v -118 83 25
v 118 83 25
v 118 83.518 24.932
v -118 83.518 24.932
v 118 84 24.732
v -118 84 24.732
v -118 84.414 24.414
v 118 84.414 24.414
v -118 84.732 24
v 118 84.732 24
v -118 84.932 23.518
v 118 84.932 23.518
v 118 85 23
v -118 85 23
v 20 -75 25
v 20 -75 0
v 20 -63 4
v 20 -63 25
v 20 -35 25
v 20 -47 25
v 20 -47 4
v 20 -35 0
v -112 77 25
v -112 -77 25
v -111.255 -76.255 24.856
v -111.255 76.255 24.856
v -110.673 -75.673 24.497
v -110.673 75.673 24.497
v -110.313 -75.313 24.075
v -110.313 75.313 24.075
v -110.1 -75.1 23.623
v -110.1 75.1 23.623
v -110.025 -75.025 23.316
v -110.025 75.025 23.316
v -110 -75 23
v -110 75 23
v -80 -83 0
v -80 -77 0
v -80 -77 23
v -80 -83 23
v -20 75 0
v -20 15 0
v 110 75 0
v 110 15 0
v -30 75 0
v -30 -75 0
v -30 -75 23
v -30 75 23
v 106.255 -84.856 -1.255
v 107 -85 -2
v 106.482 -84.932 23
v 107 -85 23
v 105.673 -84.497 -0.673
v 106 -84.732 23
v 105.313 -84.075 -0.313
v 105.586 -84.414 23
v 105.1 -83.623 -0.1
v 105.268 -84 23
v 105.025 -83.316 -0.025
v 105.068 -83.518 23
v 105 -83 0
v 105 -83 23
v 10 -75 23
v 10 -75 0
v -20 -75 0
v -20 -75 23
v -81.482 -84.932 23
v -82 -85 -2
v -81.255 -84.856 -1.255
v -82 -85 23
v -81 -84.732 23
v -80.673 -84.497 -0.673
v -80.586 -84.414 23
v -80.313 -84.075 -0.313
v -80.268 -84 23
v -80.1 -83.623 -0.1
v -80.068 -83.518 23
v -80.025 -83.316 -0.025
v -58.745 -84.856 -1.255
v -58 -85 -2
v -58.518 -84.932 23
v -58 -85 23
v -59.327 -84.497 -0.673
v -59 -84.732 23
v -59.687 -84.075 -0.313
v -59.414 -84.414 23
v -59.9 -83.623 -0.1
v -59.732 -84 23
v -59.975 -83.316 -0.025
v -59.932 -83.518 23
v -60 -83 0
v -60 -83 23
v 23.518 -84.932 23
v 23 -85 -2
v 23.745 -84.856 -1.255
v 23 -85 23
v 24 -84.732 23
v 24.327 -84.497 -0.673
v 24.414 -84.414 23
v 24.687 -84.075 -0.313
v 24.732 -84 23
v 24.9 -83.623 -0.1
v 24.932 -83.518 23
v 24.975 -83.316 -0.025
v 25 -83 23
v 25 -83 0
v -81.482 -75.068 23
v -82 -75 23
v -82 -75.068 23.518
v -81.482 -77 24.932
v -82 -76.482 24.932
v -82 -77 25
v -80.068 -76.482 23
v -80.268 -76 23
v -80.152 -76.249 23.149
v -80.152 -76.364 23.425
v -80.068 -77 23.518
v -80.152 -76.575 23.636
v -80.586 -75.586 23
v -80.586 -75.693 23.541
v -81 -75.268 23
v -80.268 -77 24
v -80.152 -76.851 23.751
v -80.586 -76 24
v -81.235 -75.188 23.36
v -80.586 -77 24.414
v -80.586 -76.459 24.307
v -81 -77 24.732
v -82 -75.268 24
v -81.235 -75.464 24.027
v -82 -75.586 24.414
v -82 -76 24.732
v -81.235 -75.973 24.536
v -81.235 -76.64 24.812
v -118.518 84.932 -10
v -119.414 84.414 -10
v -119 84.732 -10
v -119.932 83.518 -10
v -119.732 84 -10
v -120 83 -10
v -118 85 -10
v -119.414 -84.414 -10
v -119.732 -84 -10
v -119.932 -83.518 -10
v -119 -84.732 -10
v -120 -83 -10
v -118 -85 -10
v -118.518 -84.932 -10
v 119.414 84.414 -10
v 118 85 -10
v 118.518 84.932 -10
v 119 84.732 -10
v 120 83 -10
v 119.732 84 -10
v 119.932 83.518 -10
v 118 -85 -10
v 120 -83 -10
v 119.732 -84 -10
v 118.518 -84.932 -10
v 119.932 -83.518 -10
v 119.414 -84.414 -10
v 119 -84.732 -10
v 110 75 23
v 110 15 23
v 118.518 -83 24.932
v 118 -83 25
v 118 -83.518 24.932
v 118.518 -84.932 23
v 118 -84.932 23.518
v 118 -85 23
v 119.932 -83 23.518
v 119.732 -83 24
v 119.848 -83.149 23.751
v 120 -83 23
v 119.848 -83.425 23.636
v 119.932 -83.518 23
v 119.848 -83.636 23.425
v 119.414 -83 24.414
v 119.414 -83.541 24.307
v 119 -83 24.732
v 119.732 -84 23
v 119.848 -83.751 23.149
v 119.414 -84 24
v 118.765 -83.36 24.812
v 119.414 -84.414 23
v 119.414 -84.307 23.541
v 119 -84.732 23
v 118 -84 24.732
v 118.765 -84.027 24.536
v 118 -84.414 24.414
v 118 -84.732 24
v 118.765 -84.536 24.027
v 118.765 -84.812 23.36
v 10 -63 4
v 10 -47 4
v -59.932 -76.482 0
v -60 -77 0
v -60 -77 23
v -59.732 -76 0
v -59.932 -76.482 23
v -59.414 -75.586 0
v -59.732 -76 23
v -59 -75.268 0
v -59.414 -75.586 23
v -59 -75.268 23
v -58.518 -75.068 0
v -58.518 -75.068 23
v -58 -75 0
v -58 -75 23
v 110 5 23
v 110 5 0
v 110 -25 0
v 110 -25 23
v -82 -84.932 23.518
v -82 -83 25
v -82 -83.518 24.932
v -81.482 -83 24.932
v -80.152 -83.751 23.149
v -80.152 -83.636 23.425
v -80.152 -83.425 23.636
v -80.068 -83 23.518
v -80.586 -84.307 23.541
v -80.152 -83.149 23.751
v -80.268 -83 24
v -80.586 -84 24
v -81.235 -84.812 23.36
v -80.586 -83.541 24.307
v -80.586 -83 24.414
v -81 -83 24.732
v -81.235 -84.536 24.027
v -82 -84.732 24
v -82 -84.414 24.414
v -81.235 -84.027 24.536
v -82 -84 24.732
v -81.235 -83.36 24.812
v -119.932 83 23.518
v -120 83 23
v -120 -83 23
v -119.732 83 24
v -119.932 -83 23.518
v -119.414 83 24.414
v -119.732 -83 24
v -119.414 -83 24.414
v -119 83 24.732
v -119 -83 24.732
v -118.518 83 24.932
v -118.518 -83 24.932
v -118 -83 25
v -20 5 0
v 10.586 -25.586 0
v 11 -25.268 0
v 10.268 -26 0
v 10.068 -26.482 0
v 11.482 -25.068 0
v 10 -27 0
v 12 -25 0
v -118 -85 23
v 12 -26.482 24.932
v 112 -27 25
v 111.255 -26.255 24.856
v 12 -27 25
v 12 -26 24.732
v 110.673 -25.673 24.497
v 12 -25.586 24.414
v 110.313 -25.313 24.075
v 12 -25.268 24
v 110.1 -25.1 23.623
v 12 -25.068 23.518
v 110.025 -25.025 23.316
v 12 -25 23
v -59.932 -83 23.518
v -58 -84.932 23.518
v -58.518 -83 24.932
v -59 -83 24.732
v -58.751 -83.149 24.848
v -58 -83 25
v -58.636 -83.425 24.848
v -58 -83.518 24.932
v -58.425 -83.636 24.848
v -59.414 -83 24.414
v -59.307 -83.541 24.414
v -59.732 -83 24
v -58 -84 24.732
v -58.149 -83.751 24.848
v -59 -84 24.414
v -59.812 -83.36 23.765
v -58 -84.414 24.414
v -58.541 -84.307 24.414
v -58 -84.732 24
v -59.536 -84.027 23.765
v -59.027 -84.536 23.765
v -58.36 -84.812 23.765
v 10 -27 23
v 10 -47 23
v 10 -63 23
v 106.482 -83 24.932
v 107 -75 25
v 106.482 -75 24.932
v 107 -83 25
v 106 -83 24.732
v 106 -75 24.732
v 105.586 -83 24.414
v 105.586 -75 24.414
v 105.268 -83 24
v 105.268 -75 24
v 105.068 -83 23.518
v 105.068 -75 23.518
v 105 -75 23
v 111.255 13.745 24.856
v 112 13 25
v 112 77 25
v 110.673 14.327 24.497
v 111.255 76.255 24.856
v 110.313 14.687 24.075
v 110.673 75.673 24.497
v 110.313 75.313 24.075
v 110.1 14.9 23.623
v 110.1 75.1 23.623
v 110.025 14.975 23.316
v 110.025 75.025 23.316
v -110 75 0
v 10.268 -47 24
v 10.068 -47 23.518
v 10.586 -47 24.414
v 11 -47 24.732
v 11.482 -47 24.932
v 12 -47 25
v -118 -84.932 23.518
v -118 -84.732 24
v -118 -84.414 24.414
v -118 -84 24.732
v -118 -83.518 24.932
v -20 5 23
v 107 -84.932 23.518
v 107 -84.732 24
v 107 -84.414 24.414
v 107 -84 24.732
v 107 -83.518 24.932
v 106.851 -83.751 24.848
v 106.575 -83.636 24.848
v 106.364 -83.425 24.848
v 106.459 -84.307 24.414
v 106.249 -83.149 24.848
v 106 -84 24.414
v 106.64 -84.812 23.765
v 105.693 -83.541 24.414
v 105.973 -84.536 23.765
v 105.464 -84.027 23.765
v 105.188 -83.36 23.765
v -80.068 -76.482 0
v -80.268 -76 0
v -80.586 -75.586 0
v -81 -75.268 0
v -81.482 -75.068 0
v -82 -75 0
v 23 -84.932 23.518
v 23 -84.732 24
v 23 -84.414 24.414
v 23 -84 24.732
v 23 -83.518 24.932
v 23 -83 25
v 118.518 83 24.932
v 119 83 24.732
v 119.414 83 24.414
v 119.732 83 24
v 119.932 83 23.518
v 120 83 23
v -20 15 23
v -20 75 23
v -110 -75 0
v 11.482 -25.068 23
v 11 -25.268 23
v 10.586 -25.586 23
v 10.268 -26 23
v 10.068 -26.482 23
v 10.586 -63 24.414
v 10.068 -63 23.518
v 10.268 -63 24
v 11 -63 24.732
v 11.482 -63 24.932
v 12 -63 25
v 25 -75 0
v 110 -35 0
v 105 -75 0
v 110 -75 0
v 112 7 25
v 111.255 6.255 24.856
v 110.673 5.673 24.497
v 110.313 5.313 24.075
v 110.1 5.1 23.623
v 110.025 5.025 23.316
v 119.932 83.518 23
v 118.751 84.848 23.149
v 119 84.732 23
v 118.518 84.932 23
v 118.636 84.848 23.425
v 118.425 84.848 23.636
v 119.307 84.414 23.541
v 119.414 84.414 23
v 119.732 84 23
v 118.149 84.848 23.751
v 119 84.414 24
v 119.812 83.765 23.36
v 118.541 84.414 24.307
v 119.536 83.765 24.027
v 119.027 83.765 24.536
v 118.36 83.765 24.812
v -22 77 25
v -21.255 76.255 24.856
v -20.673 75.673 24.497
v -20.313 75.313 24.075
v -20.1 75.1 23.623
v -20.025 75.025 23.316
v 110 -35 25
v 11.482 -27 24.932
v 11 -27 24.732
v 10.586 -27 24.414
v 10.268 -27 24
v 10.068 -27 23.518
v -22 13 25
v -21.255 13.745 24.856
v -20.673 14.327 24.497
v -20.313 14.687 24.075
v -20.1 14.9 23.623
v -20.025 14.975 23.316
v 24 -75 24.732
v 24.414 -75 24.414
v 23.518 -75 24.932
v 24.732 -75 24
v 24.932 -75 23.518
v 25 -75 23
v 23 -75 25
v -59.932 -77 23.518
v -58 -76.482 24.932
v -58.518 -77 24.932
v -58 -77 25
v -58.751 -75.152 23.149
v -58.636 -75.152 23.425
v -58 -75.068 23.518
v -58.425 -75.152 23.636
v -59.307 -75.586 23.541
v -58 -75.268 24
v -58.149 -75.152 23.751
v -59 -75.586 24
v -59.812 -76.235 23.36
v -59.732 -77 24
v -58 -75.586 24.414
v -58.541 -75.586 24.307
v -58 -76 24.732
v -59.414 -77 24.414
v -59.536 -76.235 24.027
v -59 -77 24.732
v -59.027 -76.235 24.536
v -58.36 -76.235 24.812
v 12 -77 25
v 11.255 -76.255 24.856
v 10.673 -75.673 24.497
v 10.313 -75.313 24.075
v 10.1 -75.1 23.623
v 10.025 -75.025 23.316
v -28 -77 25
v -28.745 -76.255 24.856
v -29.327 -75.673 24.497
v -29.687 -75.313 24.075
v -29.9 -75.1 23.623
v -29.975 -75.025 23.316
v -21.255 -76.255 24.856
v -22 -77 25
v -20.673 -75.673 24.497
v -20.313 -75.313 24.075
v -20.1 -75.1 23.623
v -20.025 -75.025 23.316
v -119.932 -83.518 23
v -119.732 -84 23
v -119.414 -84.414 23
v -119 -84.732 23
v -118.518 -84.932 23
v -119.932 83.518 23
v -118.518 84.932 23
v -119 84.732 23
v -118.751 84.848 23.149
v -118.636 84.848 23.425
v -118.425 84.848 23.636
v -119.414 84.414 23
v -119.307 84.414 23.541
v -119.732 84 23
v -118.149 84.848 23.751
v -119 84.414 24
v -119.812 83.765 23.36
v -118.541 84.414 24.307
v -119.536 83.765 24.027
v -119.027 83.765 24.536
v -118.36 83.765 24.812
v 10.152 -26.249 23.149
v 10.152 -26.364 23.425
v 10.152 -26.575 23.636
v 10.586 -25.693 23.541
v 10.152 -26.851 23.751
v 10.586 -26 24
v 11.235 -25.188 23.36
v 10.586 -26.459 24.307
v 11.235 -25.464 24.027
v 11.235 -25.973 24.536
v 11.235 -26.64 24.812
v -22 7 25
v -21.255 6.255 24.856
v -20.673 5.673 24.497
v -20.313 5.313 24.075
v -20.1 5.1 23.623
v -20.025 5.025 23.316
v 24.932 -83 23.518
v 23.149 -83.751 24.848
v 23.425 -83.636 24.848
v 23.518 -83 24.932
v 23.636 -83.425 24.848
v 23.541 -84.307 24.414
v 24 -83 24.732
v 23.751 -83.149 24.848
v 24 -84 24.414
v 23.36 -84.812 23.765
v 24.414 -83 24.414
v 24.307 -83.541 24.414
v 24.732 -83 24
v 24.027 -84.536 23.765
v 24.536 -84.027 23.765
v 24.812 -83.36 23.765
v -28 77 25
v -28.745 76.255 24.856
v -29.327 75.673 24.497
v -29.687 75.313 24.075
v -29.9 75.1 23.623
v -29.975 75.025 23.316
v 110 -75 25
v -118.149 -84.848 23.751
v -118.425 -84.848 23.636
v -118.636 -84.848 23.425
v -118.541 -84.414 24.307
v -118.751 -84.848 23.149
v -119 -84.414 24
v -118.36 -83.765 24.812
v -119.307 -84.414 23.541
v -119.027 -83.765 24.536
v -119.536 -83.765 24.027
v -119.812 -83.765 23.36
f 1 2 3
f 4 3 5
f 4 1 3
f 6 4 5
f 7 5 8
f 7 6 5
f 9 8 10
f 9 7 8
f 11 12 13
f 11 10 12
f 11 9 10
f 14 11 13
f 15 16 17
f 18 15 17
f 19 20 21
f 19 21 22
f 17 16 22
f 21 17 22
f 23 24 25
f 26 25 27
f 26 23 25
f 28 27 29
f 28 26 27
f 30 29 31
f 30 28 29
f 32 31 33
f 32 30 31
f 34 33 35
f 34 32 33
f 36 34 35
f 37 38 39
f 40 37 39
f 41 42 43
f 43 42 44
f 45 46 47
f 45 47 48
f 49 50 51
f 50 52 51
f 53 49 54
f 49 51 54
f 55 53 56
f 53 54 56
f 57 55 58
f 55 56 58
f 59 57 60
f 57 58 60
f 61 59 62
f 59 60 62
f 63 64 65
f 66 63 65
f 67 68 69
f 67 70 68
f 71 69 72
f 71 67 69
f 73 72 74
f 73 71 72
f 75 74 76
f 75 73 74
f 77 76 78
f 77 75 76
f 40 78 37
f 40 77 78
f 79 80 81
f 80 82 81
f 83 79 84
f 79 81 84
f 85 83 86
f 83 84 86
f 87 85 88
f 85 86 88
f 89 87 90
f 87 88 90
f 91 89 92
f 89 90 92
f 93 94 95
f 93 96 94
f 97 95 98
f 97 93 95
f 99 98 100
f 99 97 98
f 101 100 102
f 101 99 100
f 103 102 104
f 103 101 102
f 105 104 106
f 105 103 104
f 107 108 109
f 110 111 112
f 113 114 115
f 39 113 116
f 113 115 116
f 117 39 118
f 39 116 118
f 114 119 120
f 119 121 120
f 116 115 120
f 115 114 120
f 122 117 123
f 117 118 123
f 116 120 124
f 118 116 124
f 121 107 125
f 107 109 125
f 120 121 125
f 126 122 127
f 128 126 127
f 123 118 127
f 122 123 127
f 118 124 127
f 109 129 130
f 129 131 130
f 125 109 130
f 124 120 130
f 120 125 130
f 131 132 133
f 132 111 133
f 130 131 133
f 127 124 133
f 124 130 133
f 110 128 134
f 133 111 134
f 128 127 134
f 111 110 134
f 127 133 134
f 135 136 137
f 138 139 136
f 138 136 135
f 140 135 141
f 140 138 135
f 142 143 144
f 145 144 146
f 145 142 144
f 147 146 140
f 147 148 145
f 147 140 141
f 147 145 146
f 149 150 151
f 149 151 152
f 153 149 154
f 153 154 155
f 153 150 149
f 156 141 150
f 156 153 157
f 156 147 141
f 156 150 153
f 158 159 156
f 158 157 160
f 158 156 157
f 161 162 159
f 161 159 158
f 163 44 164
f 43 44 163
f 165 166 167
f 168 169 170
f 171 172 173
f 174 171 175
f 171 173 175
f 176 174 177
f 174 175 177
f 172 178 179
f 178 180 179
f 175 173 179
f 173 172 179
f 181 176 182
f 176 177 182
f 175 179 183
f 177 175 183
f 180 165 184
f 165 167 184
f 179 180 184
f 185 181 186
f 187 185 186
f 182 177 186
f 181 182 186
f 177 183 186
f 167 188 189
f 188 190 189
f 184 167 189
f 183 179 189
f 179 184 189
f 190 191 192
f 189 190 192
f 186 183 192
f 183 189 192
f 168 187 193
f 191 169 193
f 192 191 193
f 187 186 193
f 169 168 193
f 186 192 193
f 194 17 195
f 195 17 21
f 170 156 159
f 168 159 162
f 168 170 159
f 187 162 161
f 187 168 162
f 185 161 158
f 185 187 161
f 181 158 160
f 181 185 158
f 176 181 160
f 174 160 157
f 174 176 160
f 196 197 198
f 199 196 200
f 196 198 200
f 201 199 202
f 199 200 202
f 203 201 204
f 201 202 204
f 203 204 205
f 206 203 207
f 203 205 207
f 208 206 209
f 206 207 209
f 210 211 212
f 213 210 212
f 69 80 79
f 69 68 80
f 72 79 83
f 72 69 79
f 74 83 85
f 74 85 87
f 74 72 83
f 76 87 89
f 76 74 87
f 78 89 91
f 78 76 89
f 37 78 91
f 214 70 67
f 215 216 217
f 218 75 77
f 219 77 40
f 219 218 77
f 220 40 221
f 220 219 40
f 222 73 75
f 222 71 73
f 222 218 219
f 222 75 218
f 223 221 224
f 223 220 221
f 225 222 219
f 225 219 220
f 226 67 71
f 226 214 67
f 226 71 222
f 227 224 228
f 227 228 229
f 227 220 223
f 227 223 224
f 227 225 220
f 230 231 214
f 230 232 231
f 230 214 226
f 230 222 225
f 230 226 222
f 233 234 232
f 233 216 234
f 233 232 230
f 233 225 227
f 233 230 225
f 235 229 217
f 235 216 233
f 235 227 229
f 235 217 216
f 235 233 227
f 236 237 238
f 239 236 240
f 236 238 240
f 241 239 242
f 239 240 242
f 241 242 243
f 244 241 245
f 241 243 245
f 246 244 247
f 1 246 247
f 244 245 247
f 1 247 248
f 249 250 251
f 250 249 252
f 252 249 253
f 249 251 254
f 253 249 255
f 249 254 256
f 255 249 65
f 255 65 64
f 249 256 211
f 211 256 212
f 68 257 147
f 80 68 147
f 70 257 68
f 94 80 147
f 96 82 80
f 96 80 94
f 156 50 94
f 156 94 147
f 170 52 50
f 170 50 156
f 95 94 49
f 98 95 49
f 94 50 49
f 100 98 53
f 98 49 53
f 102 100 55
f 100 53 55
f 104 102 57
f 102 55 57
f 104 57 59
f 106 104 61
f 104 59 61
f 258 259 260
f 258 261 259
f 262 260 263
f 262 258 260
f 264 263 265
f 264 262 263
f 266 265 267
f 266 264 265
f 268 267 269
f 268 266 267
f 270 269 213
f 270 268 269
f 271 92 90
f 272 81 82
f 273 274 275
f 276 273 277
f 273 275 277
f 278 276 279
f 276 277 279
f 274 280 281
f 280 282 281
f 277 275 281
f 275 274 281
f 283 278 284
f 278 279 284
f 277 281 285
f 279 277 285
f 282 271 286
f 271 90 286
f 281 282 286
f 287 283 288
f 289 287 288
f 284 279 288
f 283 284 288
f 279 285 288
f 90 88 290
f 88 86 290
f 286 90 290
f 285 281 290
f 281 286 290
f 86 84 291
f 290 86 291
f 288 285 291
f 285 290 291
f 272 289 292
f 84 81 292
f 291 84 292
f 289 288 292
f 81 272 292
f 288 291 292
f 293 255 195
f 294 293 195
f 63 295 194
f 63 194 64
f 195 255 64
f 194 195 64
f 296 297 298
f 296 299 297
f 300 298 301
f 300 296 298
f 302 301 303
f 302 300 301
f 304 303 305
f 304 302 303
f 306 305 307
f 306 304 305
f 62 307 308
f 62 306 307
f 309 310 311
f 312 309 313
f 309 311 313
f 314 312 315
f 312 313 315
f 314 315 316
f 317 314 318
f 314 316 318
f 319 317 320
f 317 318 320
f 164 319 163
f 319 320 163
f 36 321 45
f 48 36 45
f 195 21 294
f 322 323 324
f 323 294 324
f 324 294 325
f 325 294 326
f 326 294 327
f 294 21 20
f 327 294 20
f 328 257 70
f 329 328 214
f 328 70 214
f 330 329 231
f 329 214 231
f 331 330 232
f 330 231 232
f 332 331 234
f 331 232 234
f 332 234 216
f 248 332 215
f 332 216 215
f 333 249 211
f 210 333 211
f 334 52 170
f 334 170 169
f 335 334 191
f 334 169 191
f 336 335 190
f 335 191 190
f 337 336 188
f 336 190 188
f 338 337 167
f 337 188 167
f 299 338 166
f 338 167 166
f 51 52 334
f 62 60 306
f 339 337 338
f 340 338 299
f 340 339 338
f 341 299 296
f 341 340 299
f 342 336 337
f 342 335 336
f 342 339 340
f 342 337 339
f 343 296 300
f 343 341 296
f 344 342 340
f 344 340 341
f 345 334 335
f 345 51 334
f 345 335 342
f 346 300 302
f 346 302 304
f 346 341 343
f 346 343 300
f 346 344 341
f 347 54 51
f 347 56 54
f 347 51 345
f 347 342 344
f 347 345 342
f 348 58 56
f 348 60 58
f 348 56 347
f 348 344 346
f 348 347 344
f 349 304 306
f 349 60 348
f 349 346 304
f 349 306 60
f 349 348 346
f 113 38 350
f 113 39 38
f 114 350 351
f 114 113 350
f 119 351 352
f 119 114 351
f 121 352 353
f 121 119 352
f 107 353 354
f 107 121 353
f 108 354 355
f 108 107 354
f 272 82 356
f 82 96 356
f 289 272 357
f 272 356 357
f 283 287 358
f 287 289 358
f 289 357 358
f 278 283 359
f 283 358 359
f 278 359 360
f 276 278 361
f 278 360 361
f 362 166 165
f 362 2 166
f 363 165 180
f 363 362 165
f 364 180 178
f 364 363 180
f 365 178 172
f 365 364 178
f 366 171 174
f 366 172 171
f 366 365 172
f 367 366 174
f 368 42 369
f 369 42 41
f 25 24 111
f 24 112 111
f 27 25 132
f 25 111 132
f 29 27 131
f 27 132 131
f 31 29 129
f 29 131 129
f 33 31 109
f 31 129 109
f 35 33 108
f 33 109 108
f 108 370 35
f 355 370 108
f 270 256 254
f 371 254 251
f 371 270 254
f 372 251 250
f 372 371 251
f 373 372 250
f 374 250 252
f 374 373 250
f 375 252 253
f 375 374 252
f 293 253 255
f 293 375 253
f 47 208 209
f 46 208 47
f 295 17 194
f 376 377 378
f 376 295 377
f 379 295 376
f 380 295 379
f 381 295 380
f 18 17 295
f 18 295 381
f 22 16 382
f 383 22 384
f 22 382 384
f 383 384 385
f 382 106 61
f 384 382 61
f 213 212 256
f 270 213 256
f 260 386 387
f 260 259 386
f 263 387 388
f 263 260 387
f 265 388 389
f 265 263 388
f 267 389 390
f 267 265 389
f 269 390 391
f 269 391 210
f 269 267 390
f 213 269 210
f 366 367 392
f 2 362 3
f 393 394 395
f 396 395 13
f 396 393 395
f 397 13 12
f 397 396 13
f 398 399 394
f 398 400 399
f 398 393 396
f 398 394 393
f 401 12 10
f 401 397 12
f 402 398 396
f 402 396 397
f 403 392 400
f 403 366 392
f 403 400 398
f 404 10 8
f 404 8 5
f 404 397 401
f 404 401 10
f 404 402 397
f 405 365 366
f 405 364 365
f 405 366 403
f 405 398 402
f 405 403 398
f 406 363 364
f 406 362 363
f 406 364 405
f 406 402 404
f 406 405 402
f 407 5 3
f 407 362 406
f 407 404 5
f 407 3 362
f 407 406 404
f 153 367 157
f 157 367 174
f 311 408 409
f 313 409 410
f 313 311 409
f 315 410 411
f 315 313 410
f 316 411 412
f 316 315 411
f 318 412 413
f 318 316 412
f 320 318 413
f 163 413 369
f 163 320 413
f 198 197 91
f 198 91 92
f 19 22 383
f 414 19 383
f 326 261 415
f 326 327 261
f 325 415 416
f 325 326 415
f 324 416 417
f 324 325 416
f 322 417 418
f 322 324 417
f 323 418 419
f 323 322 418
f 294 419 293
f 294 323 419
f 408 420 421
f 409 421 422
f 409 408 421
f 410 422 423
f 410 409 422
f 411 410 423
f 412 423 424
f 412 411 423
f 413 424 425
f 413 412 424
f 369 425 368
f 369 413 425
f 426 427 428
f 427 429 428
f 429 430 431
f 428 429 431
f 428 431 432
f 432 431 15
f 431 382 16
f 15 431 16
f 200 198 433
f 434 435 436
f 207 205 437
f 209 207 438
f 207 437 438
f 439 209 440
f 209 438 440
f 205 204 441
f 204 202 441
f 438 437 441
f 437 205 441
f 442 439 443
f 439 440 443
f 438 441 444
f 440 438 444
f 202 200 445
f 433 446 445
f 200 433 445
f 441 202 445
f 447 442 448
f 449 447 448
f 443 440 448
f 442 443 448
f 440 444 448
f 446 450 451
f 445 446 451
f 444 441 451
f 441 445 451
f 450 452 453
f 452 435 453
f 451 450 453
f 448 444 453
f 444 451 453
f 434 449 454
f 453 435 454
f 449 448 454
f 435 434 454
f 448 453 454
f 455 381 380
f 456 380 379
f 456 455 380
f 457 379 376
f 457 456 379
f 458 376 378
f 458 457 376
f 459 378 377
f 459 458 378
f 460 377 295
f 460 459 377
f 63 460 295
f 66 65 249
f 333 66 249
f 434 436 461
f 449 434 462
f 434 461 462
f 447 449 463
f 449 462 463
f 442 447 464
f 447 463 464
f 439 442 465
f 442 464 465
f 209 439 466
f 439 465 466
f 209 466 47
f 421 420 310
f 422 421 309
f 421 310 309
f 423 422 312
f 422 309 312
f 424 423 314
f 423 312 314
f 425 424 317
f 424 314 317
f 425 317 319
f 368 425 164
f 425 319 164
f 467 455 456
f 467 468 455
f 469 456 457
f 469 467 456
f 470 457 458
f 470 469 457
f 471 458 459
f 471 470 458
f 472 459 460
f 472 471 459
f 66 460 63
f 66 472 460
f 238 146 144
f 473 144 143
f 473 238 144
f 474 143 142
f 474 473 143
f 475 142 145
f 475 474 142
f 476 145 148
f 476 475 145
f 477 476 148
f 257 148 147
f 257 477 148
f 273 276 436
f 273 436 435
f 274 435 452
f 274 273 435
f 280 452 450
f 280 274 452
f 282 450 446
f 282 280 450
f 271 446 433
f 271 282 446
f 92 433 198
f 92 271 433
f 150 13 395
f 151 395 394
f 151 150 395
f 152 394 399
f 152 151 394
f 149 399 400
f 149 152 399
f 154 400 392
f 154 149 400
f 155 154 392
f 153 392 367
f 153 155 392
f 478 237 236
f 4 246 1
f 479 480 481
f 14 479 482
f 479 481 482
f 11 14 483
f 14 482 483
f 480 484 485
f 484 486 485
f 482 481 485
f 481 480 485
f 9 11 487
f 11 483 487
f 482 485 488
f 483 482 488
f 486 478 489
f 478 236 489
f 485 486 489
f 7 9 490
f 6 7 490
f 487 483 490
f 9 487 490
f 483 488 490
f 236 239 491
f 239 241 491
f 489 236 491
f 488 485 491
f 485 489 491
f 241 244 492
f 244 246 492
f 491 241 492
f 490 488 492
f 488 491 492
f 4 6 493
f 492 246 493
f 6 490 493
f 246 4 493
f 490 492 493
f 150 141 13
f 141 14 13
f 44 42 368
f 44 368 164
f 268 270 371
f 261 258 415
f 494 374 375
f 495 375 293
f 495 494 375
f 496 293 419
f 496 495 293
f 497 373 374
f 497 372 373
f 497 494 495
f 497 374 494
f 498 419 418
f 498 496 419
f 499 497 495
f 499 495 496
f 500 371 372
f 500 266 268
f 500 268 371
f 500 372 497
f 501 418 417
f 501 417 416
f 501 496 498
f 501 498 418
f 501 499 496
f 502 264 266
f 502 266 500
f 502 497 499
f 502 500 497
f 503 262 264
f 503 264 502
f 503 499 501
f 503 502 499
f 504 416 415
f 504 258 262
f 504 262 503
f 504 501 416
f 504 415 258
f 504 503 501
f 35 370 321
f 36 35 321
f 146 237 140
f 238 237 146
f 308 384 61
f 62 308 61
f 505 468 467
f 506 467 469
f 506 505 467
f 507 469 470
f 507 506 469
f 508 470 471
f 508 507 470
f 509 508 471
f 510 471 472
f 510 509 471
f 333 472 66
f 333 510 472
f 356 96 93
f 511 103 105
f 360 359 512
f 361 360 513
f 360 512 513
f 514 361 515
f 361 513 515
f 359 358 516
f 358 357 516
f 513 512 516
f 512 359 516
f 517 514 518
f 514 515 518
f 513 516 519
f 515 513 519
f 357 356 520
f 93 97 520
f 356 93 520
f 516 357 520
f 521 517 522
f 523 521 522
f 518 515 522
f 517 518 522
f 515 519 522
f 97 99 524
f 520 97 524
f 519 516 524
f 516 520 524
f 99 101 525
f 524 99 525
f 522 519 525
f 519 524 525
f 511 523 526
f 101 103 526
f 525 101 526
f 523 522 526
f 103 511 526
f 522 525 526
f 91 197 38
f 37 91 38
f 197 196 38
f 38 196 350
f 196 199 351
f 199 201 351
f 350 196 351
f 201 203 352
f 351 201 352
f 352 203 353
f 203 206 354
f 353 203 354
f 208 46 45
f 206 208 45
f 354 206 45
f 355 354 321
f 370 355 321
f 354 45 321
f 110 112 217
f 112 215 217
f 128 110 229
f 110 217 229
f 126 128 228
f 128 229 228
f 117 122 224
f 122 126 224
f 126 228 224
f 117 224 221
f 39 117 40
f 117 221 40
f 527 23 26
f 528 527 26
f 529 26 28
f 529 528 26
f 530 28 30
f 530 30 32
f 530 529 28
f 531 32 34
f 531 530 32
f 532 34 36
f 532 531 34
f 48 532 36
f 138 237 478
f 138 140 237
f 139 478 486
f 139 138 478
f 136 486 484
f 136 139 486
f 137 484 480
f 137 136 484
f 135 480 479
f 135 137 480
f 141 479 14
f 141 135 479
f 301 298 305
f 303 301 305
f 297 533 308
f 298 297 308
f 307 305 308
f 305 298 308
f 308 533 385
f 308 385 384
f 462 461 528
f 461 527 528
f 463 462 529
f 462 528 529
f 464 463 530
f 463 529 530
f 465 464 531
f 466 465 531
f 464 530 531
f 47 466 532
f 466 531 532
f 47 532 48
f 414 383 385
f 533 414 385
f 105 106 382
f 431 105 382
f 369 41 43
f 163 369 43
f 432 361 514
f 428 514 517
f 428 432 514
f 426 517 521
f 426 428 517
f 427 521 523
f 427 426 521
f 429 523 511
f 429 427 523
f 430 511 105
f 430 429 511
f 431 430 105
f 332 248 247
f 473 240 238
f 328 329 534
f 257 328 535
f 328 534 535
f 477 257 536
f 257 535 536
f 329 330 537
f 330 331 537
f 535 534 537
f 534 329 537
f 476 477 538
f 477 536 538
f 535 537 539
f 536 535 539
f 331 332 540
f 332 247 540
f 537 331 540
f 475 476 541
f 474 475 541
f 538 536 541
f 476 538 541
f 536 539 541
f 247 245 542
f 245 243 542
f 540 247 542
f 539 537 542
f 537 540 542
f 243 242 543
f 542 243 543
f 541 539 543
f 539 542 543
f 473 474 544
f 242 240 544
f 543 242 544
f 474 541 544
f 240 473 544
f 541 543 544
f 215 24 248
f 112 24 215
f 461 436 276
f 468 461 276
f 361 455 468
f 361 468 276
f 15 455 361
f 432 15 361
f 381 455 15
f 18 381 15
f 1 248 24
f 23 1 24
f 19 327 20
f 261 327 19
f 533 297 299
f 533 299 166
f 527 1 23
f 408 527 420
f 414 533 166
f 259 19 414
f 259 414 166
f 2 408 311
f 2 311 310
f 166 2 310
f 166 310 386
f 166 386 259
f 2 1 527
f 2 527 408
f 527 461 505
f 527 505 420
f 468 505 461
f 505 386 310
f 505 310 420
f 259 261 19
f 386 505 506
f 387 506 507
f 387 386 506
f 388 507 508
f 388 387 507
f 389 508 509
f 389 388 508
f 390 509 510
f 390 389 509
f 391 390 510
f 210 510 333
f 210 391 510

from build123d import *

# Parameters (mm, degrees)
F0_W     = 80
F0_H     = 150
F0_W_2   = 130
F0_H_2   = 60
F1_DEPTH = 25
F2_W     = 240
F2_H     = 170
F3_DEPTH = 10
F4_W     = 20
F4_H     = 25
F5_DEPTH = 10
F6_R     = 2
F7_W     = 16
F7_H     = 21
F8_DEPTH = 10


with BuildPart() as f1:
    # F0 (on Top) → F1 (new body)
    with BuildSketch(Plane.XY):
        Polygon((105, -85), (120, -85), (120, 85), (-120, 85), (-120, -85), (25, -85), (25, -75), (20, -75), (20, -35), (110, -35), (110, -75), (105, -75), align=None)
        Polygon((110, 5), (110, -25), (10, -25), (10, -75), (-20, -75), (-20, -25), (-20, 5), align=None, mode=Mode.SUBTRACT)
        with Locations((-70, 0)):
            Rectangle(F0_W, F0_H, mode=Mode.SUBTRACT)
        with Locations((45, 45)):
            Rectangle(F0_W_2, F0_H_2, mode=Mode.SUBTRACT)
    extrude(amount=F1_DEPTH)

    # F2 (on face) → F3 (join)
    with BuildSketch(Plane(origin=(0, 0, 0), x_dir=(1, 0, 0), z_dir=(0, 0, -1))):
        Rectangle(F2_W, F2_H)
    extrude(amount=F3_DEPTH)

    # F4 (on face) → F5 (cut)
    with BuildSketch(Plane(origin=(0, -75, 0), x_dir=(-1, 0, 0), z_dir=(0, 1, 0))):
        with Locations((70, 12.5)):
            Rectangle(F4_W, F4_H)
    extrude(amount=-F5_DEPTH, mode=Mode.SUBTRACT)

    # F6
    f6_edges = [f1.edges().sort_by_distance(p)[0] for p in [
        (-110, 0, 25),
        (-120, 0, 25),
        (-100, -85, 25),
        (-95, -75, 25),
        (-60, -85, 12.5),
        (-80, -85, 12.5),
        (-80, -75, 12.5),
        (-60, -80, 25),
        (-60, -75, 12.5),
        (-30, 0, 25),
        (-45, -75, 25),
        (-70, -85, 0),
        (-20, -35, 25),
        (60, -25, 25),
        (-5, -75, 25),
        (10, -25, 12.5),
        (10, -50, 25),
        (25, -85, 12.5),
        (-17.5, -85, 25),
        (65, -85, 0),
        (105, -85, 12.5),
        (112.5, -85, 25),
        (120, 0, 25),
        (120, -85, 7.5),
        (-120, -85, 7.5),
        (45, 5, 25),
        (45, 15, 25),
        (-20, 45, 25),
        (-120, 85, 7.5),
        (120, 85, 7.5),
        (0, 85, 25),
        (45, 75, 25),
        (110, 45, 25),
        (110, -10, 25),
        (-80, -80, 25),
        (25, -80, 25),
        (105, -80, 25),
        (-70, 75, 25),
    ]]
    fillet(f6_edges, radius=F6_R)

    # F7 (on face) → F8 (cut)
    with BuildSketch(Plane.YZ.offset(20)):
        with Locations((-55, 14.5)):
            Rectangle(F7_W, F7_H)
    extrude(amount=-F8_DEPTH, mode=Mode.SUBTRACT)


solid = f1.part
